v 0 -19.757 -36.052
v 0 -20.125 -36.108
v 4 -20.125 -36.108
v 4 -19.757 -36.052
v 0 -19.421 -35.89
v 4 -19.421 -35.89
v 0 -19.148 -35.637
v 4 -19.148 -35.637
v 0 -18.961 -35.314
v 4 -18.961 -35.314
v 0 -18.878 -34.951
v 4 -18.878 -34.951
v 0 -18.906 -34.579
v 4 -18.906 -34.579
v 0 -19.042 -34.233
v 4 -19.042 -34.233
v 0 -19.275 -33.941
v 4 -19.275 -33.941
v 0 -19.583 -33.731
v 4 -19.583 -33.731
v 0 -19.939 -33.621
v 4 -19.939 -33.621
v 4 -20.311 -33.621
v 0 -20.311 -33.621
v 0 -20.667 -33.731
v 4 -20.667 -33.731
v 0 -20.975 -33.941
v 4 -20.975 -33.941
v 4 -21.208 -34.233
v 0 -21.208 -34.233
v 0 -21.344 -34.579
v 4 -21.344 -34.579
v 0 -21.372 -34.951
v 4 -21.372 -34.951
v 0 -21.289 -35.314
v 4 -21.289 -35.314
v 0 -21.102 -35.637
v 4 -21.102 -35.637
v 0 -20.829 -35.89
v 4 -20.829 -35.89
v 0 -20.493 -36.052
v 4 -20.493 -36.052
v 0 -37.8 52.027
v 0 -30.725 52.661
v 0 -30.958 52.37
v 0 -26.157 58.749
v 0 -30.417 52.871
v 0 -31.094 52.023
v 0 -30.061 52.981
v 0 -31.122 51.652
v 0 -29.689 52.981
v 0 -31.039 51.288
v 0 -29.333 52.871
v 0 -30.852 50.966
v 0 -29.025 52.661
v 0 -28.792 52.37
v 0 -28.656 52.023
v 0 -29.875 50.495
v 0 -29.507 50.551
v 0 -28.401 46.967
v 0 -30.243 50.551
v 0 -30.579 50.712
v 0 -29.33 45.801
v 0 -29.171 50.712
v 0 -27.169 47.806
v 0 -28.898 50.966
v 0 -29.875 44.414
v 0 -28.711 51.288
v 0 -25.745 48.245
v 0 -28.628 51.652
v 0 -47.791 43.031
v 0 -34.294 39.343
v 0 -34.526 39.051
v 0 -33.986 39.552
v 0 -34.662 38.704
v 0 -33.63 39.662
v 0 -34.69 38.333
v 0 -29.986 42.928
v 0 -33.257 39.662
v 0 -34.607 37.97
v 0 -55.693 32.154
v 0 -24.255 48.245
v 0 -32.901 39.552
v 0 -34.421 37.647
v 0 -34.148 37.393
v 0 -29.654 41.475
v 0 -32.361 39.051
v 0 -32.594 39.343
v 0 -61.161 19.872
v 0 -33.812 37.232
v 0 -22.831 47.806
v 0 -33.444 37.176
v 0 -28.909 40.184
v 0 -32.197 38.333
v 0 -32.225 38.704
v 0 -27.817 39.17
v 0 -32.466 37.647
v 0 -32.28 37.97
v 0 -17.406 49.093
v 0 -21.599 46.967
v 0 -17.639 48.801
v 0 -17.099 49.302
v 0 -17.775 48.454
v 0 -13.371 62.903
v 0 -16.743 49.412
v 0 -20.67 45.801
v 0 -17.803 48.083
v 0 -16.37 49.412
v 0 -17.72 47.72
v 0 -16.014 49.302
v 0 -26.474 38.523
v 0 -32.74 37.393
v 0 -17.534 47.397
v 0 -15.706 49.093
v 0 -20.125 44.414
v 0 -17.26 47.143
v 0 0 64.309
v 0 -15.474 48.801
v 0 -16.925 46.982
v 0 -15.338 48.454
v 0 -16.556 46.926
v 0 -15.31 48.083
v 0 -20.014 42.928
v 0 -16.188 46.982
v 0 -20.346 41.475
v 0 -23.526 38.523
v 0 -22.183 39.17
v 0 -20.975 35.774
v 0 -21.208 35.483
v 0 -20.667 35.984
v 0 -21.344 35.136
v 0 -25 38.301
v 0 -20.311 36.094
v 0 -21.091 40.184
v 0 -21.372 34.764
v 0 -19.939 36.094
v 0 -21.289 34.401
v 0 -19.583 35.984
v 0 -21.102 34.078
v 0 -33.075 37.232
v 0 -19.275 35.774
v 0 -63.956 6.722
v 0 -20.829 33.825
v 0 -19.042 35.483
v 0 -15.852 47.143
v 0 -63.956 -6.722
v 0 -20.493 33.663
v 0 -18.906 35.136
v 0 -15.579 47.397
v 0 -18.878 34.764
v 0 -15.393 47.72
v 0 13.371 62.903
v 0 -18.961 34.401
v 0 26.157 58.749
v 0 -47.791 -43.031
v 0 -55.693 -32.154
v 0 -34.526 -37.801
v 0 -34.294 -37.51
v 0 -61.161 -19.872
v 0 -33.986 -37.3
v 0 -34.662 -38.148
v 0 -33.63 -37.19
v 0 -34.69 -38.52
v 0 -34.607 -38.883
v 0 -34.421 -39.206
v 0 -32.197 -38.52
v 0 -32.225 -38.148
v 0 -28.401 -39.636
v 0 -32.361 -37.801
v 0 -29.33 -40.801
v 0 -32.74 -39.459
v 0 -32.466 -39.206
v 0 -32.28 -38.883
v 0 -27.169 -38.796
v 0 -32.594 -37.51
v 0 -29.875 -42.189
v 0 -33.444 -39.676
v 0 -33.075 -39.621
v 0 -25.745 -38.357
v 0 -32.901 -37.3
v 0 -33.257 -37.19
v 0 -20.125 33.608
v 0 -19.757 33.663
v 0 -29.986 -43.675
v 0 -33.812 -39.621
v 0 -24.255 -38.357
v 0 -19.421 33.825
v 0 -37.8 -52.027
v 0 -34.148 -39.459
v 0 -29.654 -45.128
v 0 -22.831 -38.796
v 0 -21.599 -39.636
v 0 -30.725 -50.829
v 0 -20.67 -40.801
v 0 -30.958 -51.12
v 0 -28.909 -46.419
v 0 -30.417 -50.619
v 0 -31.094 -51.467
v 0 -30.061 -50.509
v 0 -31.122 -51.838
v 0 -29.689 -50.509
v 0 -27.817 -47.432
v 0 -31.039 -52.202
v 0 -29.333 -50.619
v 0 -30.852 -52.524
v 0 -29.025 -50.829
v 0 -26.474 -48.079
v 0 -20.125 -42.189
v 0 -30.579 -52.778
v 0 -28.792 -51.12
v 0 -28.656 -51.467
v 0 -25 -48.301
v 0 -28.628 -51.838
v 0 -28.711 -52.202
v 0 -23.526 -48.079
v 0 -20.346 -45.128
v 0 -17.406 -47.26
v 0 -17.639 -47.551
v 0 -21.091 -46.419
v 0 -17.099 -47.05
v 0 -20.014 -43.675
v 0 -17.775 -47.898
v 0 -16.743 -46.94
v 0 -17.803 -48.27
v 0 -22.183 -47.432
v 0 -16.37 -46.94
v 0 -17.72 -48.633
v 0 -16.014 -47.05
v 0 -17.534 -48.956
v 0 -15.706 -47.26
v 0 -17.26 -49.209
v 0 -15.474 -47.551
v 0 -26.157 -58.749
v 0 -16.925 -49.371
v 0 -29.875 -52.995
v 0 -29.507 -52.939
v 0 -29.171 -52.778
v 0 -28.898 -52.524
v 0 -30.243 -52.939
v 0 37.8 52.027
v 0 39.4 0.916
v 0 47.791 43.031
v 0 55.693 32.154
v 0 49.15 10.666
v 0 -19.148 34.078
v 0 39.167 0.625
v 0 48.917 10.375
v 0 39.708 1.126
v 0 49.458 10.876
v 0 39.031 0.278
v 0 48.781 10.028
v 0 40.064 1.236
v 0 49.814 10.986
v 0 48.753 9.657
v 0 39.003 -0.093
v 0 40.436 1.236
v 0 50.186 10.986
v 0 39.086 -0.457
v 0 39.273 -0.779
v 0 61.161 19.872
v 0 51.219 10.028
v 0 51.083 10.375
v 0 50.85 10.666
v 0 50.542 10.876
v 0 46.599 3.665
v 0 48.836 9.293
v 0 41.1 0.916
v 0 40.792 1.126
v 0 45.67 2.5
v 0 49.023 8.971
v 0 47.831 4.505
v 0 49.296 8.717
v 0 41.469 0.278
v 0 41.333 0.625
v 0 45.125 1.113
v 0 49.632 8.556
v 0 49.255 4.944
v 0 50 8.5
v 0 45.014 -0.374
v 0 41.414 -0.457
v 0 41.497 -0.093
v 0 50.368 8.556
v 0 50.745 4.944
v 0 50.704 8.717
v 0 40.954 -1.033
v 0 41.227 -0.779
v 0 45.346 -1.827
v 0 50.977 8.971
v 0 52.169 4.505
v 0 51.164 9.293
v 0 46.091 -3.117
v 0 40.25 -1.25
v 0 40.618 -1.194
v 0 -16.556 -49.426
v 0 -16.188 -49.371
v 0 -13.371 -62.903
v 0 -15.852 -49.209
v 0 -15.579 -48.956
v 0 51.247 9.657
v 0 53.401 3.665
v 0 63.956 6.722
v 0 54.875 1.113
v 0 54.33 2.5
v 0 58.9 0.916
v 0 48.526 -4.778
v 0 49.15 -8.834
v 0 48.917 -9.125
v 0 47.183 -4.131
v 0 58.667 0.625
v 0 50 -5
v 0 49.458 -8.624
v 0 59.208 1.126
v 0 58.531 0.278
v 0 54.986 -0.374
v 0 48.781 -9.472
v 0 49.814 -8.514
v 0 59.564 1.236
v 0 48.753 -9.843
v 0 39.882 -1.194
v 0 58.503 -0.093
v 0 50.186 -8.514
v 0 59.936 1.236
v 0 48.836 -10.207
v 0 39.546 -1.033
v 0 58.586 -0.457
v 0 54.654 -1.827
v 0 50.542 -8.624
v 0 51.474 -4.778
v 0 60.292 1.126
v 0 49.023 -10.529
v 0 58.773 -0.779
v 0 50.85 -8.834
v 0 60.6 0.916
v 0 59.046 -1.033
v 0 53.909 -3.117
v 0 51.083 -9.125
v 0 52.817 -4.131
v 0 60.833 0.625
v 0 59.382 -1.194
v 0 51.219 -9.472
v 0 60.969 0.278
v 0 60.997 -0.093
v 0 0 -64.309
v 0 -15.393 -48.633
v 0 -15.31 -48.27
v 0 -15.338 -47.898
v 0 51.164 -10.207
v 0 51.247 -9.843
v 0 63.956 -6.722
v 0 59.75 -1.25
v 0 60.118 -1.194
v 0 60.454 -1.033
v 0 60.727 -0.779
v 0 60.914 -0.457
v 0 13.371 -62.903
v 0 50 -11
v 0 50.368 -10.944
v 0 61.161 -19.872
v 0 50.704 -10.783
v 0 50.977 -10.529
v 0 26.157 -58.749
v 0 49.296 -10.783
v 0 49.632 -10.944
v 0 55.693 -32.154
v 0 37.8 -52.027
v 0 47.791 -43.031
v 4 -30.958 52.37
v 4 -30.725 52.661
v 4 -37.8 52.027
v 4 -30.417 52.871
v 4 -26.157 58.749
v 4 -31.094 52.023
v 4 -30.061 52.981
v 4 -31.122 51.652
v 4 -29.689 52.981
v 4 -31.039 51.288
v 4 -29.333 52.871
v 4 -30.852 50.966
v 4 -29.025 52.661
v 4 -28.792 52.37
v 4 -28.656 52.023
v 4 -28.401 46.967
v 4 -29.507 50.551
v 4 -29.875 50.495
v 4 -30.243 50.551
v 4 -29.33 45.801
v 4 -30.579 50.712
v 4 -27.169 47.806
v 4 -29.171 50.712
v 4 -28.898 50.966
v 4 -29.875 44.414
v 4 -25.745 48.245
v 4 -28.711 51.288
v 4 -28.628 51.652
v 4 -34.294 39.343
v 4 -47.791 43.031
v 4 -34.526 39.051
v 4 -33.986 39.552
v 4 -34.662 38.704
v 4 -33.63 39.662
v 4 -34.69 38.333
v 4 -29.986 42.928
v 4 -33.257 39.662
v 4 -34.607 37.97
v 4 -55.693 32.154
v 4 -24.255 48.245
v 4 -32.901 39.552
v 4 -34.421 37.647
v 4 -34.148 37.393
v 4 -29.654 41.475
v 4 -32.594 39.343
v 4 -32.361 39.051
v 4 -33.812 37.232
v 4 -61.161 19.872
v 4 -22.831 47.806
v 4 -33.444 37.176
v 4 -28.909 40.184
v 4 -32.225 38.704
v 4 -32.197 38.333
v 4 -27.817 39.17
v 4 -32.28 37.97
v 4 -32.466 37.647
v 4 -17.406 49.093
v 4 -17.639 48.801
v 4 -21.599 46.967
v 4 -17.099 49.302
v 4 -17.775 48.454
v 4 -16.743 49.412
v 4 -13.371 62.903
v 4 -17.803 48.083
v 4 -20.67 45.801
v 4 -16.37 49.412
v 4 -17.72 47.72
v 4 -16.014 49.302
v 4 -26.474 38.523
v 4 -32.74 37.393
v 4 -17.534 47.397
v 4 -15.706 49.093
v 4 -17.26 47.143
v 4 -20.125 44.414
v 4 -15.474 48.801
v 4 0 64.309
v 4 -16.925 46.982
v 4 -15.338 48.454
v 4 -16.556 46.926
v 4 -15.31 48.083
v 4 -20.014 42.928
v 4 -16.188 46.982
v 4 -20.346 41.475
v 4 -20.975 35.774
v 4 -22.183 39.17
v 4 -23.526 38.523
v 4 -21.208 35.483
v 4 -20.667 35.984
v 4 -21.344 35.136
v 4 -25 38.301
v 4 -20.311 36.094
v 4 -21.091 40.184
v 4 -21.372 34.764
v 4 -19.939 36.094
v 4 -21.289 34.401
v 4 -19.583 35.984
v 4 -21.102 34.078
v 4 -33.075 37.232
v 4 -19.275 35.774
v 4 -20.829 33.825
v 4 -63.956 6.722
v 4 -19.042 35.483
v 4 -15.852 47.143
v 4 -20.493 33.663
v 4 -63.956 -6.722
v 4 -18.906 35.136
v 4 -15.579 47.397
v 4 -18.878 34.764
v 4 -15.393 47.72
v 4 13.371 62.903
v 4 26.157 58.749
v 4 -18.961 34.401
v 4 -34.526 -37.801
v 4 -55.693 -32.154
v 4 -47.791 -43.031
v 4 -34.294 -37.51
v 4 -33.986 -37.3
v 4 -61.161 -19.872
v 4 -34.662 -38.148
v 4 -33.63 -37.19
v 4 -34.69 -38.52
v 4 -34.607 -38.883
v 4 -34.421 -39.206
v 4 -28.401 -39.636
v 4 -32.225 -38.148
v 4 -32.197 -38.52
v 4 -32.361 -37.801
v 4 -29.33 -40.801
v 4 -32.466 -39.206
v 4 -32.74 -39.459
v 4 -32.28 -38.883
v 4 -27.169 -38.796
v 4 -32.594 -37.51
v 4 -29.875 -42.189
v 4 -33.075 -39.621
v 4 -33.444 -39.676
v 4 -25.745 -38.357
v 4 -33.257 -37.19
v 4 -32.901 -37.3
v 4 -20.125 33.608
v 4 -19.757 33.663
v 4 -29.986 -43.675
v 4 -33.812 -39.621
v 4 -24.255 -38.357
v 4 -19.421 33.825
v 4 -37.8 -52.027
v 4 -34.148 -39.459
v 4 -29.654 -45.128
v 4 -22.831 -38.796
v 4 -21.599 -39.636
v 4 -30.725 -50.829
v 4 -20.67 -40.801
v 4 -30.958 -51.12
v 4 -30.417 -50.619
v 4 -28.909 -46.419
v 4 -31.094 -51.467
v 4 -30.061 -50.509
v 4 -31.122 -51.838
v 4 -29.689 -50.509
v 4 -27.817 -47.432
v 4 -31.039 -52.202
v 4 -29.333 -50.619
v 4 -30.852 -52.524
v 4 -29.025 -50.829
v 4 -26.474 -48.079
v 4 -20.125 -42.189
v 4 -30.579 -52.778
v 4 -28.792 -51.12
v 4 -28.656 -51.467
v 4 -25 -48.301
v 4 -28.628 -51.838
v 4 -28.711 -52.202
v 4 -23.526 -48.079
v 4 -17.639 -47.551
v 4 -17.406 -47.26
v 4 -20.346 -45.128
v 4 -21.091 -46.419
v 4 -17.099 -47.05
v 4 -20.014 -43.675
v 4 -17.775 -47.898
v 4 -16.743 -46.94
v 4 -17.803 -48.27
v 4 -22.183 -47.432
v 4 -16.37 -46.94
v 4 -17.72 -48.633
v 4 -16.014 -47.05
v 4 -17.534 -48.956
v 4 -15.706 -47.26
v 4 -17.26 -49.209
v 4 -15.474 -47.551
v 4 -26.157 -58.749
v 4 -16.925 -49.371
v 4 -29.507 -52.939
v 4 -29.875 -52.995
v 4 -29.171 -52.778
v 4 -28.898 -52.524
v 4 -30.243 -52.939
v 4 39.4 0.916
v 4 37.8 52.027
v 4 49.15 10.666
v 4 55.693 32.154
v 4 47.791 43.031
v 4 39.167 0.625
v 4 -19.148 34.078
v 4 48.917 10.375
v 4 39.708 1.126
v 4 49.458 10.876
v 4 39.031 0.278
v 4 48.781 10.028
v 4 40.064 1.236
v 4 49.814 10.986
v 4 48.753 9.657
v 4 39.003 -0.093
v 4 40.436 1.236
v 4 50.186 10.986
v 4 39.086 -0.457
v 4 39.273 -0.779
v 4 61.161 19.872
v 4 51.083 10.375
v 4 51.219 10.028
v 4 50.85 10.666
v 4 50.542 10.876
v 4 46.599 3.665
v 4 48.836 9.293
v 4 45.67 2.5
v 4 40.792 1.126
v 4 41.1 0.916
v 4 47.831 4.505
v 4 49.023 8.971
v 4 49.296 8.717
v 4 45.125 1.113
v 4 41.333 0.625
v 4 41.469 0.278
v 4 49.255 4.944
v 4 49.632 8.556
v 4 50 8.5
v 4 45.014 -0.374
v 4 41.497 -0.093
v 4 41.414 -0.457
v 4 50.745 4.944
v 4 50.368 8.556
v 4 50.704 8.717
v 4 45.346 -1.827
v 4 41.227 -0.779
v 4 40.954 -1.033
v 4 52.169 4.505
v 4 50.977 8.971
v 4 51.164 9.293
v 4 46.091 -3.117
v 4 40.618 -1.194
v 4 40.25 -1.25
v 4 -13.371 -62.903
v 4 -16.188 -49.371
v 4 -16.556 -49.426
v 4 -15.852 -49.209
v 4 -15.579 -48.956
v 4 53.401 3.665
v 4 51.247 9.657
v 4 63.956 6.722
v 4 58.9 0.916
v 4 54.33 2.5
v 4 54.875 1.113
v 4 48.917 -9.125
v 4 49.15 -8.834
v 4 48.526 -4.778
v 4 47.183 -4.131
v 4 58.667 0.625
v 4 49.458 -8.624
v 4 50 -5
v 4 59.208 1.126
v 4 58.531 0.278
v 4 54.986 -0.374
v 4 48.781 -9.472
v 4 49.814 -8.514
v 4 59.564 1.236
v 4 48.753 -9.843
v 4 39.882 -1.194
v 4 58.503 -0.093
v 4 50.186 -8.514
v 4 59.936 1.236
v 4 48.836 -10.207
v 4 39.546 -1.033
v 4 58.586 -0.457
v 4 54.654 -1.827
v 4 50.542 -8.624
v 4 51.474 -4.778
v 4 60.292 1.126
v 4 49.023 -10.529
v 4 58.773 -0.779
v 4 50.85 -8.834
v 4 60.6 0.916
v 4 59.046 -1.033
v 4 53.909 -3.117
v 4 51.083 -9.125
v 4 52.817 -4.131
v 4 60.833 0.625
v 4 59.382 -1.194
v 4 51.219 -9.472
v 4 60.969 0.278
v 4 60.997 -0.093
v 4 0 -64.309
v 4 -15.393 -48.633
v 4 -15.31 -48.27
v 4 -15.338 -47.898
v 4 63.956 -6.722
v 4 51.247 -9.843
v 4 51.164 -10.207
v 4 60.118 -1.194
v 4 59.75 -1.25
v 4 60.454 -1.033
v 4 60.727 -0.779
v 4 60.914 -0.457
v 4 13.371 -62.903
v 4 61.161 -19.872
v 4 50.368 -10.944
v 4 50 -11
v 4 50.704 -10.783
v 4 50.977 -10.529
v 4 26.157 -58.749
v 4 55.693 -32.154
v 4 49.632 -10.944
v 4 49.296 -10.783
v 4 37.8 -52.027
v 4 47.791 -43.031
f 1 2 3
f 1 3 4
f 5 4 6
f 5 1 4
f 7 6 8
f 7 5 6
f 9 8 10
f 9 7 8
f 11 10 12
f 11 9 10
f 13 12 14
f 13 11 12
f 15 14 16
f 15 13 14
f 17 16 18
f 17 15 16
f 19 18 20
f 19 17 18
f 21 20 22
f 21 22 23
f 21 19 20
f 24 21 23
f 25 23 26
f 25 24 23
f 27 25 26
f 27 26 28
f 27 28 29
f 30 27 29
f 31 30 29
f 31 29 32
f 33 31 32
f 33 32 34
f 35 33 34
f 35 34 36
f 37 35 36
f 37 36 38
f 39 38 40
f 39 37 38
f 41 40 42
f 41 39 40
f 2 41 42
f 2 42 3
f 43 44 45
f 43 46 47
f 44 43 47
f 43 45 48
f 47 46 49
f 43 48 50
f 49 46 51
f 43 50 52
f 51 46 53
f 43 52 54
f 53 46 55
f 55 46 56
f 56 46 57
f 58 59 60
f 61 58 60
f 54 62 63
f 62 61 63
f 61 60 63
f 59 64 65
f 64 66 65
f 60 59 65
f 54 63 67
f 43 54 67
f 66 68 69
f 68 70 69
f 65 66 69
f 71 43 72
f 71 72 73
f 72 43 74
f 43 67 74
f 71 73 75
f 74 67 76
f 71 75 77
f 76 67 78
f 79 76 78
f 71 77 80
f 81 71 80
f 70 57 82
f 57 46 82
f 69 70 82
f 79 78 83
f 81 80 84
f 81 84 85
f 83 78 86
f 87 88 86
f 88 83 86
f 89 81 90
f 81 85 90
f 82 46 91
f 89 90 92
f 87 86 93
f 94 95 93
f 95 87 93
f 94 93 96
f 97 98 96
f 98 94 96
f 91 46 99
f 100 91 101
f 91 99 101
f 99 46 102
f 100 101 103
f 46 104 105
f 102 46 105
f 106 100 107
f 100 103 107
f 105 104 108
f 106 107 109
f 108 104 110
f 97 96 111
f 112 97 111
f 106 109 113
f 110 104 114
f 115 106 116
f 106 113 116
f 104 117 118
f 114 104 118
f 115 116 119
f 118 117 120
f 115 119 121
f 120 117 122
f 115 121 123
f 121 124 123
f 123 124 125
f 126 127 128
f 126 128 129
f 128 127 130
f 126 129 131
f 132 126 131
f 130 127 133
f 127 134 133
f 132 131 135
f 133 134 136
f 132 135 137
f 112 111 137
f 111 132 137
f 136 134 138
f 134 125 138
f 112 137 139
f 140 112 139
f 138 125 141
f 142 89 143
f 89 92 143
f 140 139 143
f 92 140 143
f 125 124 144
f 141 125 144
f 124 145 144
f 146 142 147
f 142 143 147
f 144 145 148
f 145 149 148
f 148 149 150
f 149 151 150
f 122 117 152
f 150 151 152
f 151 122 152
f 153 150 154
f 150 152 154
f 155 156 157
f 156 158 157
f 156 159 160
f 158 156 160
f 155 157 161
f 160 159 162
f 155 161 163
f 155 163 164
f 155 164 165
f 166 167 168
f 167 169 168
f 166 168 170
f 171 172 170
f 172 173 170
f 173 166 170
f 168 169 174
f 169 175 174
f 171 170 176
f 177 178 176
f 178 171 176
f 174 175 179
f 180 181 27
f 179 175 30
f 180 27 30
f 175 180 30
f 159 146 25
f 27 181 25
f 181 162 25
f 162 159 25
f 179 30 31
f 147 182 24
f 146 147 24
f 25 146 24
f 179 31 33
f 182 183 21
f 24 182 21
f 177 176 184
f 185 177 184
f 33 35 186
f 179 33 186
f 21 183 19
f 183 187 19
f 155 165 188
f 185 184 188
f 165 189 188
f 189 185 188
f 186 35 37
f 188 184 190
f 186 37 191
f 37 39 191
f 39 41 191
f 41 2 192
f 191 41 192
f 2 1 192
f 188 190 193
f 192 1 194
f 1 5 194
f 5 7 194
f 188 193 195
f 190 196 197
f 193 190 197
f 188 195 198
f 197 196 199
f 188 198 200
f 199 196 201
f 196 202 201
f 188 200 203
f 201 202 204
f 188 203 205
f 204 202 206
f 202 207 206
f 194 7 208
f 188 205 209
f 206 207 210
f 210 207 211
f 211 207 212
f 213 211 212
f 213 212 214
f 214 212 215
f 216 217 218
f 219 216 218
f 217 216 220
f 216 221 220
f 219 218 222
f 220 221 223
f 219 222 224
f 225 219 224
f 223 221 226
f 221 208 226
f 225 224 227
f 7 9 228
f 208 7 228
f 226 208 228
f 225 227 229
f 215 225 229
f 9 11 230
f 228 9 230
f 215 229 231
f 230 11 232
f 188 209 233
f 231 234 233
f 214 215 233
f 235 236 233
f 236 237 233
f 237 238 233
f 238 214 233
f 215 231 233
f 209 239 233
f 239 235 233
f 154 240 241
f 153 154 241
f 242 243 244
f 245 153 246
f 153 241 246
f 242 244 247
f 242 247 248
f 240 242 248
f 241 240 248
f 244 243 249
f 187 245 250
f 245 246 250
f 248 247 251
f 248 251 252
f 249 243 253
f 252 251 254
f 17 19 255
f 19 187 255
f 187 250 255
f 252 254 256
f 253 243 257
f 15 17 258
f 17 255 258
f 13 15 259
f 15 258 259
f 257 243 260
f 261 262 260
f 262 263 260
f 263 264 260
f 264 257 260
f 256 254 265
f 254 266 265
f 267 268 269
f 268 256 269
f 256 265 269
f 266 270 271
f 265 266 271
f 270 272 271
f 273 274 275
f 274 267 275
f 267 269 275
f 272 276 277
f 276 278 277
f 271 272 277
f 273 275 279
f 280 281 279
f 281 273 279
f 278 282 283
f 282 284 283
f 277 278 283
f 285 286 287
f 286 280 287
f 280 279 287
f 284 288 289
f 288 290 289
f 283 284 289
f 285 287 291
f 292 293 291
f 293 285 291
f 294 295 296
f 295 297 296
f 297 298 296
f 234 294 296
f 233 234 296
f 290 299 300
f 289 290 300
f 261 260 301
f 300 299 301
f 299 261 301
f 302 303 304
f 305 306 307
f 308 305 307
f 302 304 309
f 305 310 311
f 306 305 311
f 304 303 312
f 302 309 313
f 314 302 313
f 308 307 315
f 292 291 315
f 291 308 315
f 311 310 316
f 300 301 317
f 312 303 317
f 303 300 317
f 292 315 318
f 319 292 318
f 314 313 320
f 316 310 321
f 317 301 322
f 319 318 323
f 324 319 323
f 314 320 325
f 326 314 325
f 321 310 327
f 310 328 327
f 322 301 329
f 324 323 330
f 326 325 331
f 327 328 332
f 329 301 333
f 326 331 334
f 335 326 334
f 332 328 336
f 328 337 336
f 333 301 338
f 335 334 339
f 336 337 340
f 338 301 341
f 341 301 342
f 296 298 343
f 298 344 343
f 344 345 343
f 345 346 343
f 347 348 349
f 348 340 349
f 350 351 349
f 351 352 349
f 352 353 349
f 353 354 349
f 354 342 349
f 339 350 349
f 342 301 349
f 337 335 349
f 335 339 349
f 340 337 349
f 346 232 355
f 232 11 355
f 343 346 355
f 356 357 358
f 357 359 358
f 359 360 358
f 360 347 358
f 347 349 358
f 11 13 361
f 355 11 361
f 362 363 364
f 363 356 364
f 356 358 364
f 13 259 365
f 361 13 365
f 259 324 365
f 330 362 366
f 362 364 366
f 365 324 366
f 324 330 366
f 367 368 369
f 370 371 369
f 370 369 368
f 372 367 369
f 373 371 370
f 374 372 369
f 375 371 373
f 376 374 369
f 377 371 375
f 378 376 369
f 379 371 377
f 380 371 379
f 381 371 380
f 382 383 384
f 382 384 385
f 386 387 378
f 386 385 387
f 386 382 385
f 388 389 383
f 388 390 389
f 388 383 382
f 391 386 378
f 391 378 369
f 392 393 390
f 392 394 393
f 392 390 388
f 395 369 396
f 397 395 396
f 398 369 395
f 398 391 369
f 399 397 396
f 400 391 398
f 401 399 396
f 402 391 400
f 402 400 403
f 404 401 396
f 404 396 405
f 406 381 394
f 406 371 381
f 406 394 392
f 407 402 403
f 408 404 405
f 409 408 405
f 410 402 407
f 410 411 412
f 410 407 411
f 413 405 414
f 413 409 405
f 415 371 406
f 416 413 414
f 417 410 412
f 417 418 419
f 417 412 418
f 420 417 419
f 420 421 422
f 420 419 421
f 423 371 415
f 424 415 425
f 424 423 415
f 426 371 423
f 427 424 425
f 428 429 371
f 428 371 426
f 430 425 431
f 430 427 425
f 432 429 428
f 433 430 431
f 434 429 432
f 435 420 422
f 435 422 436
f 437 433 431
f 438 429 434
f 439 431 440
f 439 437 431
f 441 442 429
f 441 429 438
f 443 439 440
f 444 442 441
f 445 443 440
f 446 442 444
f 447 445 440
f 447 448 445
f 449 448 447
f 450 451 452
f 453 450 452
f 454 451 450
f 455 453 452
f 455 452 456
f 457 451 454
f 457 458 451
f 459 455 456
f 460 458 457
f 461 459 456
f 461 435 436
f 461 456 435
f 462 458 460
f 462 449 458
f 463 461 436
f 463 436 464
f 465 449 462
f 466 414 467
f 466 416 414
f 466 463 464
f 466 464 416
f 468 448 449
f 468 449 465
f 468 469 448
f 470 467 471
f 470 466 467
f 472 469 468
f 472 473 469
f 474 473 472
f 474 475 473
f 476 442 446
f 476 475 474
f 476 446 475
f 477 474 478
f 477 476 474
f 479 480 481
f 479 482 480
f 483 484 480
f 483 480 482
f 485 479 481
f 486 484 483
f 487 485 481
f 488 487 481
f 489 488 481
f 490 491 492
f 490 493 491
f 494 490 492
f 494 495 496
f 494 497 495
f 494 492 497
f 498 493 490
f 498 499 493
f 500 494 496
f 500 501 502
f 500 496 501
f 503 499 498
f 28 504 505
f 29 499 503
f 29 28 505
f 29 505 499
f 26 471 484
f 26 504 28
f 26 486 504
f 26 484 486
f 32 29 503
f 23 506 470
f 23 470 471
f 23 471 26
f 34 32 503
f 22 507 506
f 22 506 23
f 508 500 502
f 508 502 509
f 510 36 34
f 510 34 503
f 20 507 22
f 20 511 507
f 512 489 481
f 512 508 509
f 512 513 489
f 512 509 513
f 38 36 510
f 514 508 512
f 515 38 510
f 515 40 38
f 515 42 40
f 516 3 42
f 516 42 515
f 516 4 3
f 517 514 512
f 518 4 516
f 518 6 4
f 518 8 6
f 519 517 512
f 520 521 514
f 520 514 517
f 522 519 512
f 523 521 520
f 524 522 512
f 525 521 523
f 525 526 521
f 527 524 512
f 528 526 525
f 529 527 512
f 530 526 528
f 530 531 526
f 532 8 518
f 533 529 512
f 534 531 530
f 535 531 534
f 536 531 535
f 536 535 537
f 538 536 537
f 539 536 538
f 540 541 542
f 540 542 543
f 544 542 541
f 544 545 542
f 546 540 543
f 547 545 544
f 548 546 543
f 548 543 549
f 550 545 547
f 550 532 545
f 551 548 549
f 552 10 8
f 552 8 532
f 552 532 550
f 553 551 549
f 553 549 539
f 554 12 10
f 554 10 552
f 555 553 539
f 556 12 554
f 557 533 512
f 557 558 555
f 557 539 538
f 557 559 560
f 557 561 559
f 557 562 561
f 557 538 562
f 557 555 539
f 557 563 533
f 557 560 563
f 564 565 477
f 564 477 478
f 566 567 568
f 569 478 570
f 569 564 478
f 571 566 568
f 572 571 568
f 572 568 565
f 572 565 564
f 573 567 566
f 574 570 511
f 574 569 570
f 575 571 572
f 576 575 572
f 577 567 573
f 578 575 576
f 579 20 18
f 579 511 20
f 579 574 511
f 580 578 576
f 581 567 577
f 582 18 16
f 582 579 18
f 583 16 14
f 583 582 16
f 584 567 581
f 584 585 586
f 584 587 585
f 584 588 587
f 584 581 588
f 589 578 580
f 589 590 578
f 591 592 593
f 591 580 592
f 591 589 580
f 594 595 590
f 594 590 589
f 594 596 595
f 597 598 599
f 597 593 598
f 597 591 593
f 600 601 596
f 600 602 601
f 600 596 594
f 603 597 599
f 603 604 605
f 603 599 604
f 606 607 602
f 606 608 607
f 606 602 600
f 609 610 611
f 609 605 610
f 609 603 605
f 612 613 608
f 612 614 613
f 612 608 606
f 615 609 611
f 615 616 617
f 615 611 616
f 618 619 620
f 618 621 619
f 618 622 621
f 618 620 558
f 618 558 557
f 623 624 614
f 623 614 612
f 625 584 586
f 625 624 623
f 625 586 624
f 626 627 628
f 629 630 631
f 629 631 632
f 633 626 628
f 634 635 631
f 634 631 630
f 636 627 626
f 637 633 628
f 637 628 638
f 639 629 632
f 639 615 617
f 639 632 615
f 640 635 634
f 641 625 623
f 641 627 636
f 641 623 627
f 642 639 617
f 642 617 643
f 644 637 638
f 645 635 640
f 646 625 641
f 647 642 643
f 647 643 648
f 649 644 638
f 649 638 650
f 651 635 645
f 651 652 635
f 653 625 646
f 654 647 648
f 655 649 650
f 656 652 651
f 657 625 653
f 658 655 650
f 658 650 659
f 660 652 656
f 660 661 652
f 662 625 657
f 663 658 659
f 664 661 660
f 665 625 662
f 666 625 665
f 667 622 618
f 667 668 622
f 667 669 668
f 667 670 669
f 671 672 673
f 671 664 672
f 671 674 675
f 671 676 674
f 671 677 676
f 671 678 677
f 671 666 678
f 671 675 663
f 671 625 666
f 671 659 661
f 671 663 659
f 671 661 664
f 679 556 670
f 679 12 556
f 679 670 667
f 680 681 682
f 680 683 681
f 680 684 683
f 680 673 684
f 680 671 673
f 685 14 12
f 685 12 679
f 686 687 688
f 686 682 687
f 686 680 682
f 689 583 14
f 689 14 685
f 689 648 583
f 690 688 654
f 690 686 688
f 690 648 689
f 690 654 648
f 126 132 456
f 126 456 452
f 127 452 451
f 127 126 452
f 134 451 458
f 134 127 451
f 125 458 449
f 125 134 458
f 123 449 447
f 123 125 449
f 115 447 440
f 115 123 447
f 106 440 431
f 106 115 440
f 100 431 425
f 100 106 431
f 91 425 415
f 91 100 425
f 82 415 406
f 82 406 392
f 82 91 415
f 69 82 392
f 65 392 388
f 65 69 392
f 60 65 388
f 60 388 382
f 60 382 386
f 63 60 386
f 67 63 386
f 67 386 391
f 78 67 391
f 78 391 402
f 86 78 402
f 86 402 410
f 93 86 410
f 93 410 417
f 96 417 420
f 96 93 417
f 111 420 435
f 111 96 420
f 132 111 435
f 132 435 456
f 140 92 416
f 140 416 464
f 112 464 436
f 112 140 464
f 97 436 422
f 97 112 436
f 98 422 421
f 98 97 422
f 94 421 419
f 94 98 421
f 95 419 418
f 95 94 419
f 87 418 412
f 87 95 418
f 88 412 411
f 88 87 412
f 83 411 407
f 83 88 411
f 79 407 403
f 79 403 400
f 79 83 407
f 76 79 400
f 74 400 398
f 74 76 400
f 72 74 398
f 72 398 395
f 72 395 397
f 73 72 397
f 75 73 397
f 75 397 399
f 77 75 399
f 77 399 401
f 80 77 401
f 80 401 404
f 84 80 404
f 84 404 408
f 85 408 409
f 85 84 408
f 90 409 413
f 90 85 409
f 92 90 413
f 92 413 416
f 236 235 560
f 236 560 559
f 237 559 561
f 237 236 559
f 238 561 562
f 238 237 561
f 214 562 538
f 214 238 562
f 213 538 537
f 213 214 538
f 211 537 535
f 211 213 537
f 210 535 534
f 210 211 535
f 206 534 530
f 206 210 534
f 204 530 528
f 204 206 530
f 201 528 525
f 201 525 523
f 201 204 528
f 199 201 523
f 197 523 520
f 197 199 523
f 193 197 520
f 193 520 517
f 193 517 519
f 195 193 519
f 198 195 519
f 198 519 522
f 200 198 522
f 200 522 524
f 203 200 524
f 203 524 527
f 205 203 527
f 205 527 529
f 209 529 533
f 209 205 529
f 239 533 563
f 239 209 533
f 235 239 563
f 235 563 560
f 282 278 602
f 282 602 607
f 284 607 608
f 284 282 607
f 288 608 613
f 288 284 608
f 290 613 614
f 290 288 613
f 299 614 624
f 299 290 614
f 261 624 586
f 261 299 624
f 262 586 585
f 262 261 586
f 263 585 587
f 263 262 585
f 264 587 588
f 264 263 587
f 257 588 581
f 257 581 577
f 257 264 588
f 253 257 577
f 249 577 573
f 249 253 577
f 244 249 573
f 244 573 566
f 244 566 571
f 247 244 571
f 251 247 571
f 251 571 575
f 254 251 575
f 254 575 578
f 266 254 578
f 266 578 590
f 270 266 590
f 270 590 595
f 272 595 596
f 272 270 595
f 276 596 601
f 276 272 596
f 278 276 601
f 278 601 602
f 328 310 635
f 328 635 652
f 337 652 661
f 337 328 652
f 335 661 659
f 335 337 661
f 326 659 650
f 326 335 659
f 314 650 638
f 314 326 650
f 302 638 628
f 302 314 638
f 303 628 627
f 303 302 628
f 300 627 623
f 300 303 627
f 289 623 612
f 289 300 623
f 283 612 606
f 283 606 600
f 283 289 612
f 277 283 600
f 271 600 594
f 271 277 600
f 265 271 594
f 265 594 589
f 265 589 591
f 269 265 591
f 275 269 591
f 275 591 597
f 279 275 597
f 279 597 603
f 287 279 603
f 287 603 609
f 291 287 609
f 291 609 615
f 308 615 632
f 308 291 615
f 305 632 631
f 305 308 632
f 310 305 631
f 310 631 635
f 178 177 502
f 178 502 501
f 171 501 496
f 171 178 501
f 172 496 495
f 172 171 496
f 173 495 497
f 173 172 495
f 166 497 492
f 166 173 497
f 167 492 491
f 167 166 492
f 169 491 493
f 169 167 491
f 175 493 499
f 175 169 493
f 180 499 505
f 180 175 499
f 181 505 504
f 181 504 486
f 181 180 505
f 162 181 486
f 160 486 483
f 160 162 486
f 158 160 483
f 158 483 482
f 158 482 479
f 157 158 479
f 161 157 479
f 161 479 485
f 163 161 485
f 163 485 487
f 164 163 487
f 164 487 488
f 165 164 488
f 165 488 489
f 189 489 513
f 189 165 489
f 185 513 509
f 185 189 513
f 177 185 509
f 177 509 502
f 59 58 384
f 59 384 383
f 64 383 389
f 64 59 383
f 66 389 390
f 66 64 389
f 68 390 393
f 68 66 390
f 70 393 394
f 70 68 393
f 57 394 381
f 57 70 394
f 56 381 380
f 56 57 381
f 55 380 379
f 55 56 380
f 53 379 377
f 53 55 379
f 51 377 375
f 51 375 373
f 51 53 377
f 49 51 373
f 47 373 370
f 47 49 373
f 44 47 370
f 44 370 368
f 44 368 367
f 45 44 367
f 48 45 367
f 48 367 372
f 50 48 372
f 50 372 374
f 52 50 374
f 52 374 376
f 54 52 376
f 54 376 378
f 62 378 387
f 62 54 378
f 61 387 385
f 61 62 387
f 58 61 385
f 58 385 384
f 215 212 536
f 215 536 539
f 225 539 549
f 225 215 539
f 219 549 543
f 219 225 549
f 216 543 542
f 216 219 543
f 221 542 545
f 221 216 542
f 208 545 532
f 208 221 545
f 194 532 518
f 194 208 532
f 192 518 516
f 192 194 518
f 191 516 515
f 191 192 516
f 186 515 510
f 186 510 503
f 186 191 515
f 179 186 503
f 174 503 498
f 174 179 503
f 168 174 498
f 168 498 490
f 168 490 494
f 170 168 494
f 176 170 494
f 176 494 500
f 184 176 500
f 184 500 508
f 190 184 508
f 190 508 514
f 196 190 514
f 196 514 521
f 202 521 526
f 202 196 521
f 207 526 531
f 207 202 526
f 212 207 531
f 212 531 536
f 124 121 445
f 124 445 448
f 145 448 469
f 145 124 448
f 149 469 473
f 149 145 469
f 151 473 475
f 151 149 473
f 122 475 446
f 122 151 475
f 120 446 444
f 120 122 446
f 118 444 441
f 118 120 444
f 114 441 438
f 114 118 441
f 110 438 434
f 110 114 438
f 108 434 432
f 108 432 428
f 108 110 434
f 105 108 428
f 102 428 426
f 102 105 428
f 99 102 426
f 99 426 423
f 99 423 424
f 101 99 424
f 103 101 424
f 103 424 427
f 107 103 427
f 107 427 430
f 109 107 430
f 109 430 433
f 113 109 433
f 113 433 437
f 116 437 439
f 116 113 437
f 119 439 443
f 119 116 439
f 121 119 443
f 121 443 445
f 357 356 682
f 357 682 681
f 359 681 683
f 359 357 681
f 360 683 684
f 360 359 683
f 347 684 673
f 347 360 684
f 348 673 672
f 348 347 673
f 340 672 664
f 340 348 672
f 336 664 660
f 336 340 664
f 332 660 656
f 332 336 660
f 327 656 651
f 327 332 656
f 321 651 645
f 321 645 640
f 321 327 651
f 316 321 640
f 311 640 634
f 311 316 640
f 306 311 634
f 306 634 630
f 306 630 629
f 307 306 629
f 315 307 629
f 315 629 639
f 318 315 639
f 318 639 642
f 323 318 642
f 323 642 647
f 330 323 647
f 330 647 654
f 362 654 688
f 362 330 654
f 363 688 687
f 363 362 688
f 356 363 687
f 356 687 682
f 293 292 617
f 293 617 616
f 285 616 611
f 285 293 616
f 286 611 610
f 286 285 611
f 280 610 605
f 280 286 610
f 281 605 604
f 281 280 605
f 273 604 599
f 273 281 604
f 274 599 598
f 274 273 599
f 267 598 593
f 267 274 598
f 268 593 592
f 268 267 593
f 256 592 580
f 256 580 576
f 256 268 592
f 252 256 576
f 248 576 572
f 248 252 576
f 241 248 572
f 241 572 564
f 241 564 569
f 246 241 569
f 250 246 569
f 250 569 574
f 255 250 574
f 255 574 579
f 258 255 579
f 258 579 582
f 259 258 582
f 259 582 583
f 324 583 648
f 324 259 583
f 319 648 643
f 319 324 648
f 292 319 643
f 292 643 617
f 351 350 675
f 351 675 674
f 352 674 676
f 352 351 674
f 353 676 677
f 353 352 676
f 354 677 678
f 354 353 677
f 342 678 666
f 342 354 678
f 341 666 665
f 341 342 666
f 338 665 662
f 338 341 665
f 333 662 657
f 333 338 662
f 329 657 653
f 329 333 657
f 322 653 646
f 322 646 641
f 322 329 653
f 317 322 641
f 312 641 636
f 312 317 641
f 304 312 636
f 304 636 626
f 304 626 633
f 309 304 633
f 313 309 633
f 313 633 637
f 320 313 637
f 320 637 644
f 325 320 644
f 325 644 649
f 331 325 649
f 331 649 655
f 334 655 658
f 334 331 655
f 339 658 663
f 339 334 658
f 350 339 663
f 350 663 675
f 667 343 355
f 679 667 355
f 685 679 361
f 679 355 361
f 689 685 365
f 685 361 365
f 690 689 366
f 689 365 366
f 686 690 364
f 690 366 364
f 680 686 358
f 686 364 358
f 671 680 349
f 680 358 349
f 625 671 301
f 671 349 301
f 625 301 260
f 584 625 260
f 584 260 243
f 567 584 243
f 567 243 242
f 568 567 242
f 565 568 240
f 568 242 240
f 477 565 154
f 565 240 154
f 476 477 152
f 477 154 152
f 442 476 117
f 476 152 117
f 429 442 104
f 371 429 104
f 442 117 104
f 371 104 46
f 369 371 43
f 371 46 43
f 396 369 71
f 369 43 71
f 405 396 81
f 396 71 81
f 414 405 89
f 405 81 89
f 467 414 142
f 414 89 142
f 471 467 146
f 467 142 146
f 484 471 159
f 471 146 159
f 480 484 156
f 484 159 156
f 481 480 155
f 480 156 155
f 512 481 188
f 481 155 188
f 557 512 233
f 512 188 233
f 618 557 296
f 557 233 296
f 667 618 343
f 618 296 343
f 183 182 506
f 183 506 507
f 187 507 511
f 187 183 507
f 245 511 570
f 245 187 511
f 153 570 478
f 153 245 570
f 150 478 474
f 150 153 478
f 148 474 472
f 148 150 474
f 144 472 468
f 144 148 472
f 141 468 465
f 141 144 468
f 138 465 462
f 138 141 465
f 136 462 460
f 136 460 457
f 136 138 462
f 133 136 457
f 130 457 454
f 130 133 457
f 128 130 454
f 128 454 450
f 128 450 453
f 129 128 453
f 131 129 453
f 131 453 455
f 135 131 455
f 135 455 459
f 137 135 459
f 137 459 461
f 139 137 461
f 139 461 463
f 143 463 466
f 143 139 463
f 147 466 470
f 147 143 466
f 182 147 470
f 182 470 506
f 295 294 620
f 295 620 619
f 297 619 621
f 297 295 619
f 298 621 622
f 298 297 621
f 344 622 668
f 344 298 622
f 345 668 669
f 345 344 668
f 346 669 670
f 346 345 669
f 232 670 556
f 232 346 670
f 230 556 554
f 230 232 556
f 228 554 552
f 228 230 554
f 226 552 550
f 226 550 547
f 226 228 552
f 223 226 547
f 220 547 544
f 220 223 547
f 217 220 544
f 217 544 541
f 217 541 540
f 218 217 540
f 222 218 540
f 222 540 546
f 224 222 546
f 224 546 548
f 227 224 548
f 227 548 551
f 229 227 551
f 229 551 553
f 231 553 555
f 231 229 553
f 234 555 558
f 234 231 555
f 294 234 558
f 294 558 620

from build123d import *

# Parameters (mm, degrees)
SKETCH1_R           = 64.308589671
SKETCH1_R_2         = 1.25
SKETCH1_R_3         = 5
BOSS_EXTRUDE2_DEPTH = 4


with BuildPart() as part:
    # Sketch1 → Boss-Extrude2 (new body)
    with BuildSketch(Plane(origin=(0, 0, 0), x_dir=(0, 0, -1), z_dir=(1, 0, 0))):
        Circle(SKETCH1_R)
        with Locations((51.745017876, -29.875)):
            Circle(SKETCH1_R_2, mode=Mode.SUBTRACT)
        with Locations((0, 50)):
            Circle(SKETCH1_R_3, mode=Mode.SUBTRACT)
        with Locations((48.176270189, -16.556252313)):
            Circle(SKETCH1_R_2, mode=Mode.SUBTRACT)
        with Locations((43.301270189, -25)):
            Circle(SKETCH1_R_3, mode=Mode.SUBTRACT)
        with Locations((0, 59.75)):
            Circle(SKETCH1_R_2, mode=Mode.SUBTRACT)
        with Locations((9.75, 50)):
            Circle(SKETCH1_R_2, mode=Mode.SUBTRACT)
        with Locations((0, 40.25)):
            Circle(SKETCH1_R_2, mode=Mode.SUBTRACT)
        with Locations((-9.75, 50)):
            Circle(SKETCH1_R_2, mode=Mode.SUBTRACT)
        with Locations((38.426270189, -33.443747687)):
            Circle(SKETCH1_R_2, mode=Mode.SUBTRACT)
        with Locations((34.857522502, -20.125)):
            Circle(SKETCH1_R_2, mode=Mode.SUBTRACT)
        with Locations((-51.745017876, -29.875)):
            Circle(SKETCH1_R_2, mode=Mode.SUBTRACT)
        with Locations((-38.426270189, -33.443747687)):
            Circle(SKETCH1_R_2, mode=Mode.SUBTRACT)
        with Locations((-43.301270189, -25)):
            Circle(SKETCH1_R_3, mode=Mode.SUBTRACT)
        with Locations((-48.176270189, -16.556252313)):
            Circle(SKETCH1_R_2, mode=Mode.SUBTRACT)
        with Locations((-34.857522502, -20.125)):
            Circle(SKETCH1_R_2, mode=Mode.SUBTRACT)
    extrude(amount=BOSS_EXTRUDE2_DEPTH)


solid = part.part
